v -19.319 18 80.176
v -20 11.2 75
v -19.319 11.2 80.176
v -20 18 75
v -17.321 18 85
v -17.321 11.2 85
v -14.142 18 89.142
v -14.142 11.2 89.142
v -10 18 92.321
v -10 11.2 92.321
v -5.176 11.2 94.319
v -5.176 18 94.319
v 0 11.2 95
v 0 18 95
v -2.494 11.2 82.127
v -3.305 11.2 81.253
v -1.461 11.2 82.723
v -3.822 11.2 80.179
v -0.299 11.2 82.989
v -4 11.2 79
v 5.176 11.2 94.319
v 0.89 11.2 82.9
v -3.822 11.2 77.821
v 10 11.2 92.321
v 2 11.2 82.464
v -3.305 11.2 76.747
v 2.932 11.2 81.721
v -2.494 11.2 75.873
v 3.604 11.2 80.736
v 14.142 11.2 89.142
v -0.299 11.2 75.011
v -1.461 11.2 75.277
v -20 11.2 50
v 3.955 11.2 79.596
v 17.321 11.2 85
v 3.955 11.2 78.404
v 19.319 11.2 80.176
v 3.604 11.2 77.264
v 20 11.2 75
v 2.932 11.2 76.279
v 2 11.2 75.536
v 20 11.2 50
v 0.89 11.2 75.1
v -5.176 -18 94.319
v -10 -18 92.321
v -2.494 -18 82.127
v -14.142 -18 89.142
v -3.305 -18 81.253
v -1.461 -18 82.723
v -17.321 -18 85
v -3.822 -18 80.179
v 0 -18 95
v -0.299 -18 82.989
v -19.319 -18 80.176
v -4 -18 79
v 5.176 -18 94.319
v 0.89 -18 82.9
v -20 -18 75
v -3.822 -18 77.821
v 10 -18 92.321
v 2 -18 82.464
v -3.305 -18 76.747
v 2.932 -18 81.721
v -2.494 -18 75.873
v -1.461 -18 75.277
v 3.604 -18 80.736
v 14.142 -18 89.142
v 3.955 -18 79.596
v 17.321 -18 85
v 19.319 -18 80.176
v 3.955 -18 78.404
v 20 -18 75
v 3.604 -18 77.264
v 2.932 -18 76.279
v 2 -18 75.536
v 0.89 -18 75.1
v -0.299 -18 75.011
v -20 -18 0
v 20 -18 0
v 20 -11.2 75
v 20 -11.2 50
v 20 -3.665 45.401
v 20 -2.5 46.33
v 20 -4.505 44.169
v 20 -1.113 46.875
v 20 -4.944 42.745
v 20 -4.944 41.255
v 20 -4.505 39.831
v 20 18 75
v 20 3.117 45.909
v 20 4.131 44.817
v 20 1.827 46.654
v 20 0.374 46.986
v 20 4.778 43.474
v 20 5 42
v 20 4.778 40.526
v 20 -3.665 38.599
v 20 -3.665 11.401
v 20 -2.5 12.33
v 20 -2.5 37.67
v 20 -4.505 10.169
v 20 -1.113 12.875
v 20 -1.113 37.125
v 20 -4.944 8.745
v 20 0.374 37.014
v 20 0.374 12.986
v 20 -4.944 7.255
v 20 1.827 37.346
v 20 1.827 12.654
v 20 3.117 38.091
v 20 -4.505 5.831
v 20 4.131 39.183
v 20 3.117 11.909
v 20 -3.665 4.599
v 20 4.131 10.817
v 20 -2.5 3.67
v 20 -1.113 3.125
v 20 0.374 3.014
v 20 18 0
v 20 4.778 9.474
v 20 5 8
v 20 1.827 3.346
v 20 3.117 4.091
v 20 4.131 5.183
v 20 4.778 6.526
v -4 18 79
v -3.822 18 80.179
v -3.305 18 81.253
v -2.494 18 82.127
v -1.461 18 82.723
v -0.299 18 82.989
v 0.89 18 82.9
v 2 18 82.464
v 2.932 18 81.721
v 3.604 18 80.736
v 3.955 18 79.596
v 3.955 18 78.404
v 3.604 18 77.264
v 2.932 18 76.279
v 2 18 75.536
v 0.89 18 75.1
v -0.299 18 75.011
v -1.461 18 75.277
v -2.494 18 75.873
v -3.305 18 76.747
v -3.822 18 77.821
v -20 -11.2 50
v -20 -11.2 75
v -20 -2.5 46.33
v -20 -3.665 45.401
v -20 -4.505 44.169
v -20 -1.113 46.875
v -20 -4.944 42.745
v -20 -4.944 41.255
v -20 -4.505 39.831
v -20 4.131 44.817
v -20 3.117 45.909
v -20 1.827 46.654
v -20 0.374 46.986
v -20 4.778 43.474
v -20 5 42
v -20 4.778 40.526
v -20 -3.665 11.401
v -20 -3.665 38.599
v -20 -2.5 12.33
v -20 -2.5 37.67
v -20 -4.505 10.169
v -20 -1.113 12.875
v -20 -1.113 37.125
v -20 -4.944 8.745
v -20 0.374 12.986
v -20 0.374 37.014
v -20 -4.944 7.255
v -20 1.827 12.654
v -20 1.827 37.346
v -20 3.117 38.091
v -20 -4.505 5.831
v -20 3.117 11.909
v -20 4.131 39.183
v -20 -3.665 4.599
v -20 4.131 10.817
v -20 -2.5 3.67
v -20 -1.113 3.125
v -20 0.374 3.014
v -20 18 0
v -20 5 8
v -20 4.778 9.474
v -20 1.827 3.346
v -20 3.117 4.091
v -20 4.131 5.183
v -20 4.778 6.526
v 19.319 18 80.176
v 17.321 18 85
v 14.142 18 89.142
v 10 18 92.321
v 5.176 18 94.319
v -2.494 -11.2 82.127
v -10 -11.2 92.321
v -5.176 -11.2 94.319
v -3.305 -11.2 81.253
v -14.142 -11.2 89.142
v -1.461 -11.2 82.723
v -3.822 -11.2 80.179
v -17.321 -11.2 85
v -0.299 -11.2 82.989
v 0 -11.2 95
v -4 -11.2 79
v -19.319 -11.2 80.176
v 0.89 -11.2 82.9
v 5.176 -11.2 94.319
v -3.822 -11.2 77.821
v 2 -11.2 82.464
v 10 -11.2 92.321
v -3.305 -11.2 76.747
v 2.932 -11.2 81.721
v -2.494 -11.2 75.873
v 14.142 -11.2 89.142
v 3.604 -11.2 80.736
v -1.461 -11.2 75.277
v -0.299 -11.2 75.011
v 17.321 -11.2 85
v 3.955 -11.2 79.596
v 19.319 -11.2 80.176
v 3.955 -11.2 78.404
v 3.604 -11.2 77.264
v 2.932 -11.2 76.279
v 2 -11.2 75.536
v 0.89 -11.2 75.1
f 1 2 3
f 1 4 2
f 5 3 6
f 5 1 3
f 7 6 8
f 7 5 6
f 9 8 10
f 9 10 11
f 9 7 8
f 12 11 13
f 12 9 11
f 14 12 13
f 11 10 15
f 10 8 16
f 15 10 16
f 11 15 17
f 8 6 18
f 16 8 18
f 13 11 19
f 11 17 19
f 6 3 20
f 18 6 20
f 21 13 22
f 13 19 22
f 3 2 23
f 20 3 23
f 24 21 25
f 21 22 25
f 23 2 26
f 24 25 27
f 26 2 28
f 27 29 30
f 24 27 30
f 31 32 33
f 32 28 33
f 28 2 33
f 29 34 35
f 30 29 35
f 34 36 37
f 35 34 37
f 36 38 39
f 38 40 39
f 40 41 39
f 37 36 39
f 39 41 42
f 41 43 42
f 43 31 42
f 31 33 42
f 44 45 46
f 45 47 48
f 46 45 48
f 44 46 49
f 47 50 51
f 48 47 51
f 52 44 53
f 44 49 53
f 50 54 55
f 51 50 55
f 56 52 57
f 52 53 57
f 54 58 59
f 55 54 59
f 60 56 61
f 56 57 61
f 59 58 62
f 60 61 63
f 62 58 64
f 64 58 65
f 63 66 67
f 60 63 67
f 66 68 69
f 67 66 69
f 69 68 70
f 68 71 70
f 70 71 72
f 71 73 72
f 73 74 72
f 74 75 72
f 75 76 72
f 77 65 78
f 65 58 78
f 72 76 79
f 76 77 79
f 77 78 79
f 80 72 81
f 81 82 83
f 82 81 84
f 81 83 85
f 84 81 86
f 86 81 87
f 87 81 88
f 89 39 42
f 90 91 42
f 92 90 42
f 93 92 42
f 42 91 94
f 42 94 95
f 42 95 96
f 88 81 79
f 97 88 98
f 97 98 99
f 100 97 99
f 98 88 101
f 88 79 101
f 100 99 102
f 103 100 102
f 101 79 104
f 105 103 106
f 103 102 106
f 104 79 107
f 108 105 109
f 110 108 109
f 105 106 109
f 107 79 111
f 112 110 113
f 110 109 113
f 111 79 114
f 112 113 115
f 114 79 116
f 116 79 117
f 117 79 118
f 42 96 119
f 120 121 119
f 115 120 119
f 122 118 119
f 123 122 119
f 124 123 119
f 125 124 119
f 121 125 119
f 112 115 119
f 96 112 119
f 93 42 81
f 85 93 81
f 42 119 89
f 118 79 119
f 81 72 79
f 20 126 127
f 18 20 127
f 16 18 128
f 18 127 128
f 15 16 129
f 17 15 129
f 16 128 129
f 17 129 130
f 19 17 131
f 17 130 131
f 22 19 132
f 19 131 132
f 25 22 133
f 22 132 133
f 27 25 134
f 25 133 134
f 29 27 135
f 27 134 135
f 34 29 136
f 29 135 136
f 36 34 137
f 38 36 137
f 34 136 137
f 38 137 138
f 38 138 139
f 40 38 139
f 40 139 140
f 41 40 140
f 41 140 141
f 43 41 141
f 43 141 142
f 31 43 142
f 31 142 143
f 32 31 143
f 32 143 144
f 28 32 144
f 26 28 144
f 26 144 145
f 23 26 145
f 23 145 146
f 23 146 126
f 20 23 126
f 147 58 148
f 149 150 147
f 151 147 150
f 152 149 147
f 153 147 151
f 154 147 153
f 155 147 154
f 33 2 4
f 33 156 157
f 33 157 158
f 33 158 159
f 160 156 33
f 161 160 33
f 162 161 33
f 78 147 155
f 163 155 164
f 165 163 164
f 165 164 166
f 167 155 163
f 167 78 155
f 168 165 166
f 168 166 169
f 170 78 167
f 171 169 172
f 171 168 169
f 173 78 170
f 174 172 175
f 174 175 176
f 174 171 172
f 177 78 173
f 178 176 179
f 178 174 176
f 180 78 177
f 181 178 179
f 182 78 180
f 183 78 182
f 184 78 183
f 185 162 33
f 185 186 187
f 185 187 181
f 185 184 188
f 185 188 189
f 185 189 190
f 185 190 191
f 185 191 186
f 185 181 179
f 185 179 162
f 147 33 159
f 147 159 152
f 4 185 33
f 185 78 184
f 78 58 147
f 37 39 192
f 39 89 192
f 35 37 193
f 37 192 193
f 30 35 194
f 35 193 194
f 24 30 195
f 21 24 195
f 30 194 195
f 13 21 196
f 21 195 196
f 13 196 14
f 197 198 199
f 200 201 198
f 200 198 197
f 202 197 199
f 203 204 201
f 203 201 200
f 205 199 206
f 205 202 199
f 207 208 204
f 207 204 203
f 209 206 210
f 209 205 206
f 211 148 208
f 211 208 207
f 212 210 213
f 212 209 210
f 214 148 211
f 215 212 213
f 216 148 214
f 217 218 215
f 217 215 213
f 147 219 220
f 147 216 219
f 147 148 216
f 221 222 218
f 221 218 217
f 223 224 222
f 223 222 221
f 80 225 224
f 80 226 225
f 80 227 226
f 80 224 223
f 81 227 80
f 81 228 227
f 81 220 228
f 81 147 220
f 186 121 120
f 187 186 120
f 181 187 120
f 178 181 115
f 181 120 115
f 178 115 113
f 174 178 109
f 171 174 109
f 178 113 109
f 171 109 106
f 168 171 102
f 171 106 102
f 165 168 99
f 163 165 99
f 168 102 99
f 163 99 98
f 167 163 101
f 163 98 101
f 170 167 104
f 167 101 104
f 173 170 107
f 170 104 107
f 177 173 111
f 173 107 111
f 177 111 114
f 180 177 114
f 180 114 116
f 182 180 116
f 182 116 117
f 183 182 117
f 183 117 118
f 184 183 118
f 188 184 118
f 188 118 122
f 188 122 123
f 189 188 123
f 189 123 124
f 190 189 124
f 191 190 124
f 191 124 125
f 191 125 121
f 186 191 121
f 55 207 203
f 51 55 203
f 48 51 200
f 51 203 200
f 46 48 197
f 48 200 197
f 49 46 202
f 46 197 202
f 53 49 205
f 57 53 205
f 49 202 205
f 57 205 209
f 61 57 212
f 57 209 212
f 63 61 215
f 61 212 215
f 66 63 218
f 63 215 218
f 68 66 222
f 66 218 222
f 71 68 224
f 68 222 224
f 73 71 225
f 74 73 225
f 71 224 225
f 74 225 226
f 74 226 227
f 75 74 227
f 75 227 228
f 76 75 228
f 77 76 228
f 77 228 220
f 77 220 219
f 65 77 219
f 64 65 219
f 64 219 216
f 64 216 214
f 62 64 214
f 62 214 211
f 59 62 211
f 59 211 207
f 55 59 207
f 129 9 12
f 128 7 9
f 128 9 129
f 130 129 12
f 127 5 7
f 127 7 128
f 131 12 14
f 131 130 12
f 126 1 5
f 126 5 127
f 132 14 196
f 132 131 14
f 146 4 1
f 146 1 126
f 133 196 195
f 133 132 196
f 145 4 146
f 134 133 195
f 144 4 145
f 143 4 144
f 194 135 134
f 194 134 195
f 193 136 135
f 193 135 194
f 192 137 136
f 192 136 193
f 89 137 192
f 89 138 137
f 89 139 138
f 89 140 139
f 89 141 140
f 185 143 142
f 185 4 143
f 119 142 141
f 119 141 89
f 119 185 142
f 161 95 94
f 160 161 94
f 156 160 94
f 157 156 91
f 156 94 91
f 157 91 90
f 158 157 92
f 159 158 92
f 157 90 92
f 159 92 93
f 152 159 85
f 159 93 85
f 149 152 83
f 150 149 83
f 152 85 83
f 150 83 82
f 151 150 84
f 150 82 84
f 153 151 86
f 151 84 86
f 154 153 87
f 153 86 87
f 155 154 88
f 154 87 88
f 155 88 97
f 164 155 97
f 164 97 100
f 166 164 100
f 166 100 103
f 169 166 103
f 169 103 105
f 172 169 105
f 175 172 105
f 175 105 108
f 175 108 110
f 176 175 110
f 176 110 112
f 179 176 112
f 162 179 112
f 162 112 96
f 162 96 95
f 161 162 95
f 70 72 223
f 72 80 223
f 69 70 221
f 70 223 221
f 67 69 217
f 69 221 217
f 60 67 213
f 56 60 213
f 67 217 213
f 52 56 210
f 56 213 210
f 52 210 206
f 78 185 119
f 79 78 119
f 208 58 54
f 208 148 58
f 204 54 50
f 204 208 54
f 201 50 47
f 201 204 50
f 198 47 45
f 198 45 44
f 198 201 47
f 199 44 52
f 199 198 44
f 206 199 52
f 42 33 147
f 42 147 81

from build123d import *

# Parameters (mm, degrees)
F0_W     = 40
F0_H     = 36
F1_DEPTH = 50
F2_R     = 5
F3_DEPTH = 45
F4_W     = 40
F4_H     = 6.8
F5_DEPTH = 45
F6_R     = 19.99999
F7_R     = 4
F8_DEPTH = 50


# Not quite as in the source:
# - a fillet or chamfer is up to 0.001 mm smaller than in the source, because OpenCascade refuses the exact size


with BuildPart() as f1:
    # F0 (on Top) → F1 (new body)
    with BuildSketch(Plane.XY):
        Rectangle(F0_W, F0_H)
    extrude(amount=F1_DEPTH)

    # F2 (on face) → F3 (cut)
    with BuildSketch(Plane.YZ.offset(20)):
        with Locations((0, 42)):
            Circle(F2_R)
        with Locations((0, 8)):
            Circle(F2_R)
    extrude(amount=-F3_DEPTH, mode=Mode.SUBTRACT)

    # F4 (on face) → F5 (join)
    with BuildSketch(Plane.XY.offset(50)):
        with Locations((0, -14.6)):
            Rectangle(F4_W, F4_H)
        with Locations((0, 14.6)):
            Rectangle(F4_W, F4_H)
    extrude(amount=F5_DEPTH)

    # F6 (radius 20 in the source; OpenCascade refuses exactly that, so slightly less here)
    f6_edges = [f1.edges().sort_by_distance(p)[0] for p in [
        (20, 14.6, 95),
        (20, -14.6, 95),
        (-20, 14.6, 95),
        (-20, -14.6, 95),
    ]]
    fillet(f6_edges, radius=F6_R)

    # F7 (on face) → F8 (cut)
    with BuildSketch(Plane(origin=(0, 18, 0), x_dir=(-1, 0, 0), z_dir=(0, 1, 0))):
        with Locations((0, 79)):
            Circle(F7_R)
    extrude(amount=-F8_DEPTH, mode=Mode.SUBTRACT)


solid = f1.part
